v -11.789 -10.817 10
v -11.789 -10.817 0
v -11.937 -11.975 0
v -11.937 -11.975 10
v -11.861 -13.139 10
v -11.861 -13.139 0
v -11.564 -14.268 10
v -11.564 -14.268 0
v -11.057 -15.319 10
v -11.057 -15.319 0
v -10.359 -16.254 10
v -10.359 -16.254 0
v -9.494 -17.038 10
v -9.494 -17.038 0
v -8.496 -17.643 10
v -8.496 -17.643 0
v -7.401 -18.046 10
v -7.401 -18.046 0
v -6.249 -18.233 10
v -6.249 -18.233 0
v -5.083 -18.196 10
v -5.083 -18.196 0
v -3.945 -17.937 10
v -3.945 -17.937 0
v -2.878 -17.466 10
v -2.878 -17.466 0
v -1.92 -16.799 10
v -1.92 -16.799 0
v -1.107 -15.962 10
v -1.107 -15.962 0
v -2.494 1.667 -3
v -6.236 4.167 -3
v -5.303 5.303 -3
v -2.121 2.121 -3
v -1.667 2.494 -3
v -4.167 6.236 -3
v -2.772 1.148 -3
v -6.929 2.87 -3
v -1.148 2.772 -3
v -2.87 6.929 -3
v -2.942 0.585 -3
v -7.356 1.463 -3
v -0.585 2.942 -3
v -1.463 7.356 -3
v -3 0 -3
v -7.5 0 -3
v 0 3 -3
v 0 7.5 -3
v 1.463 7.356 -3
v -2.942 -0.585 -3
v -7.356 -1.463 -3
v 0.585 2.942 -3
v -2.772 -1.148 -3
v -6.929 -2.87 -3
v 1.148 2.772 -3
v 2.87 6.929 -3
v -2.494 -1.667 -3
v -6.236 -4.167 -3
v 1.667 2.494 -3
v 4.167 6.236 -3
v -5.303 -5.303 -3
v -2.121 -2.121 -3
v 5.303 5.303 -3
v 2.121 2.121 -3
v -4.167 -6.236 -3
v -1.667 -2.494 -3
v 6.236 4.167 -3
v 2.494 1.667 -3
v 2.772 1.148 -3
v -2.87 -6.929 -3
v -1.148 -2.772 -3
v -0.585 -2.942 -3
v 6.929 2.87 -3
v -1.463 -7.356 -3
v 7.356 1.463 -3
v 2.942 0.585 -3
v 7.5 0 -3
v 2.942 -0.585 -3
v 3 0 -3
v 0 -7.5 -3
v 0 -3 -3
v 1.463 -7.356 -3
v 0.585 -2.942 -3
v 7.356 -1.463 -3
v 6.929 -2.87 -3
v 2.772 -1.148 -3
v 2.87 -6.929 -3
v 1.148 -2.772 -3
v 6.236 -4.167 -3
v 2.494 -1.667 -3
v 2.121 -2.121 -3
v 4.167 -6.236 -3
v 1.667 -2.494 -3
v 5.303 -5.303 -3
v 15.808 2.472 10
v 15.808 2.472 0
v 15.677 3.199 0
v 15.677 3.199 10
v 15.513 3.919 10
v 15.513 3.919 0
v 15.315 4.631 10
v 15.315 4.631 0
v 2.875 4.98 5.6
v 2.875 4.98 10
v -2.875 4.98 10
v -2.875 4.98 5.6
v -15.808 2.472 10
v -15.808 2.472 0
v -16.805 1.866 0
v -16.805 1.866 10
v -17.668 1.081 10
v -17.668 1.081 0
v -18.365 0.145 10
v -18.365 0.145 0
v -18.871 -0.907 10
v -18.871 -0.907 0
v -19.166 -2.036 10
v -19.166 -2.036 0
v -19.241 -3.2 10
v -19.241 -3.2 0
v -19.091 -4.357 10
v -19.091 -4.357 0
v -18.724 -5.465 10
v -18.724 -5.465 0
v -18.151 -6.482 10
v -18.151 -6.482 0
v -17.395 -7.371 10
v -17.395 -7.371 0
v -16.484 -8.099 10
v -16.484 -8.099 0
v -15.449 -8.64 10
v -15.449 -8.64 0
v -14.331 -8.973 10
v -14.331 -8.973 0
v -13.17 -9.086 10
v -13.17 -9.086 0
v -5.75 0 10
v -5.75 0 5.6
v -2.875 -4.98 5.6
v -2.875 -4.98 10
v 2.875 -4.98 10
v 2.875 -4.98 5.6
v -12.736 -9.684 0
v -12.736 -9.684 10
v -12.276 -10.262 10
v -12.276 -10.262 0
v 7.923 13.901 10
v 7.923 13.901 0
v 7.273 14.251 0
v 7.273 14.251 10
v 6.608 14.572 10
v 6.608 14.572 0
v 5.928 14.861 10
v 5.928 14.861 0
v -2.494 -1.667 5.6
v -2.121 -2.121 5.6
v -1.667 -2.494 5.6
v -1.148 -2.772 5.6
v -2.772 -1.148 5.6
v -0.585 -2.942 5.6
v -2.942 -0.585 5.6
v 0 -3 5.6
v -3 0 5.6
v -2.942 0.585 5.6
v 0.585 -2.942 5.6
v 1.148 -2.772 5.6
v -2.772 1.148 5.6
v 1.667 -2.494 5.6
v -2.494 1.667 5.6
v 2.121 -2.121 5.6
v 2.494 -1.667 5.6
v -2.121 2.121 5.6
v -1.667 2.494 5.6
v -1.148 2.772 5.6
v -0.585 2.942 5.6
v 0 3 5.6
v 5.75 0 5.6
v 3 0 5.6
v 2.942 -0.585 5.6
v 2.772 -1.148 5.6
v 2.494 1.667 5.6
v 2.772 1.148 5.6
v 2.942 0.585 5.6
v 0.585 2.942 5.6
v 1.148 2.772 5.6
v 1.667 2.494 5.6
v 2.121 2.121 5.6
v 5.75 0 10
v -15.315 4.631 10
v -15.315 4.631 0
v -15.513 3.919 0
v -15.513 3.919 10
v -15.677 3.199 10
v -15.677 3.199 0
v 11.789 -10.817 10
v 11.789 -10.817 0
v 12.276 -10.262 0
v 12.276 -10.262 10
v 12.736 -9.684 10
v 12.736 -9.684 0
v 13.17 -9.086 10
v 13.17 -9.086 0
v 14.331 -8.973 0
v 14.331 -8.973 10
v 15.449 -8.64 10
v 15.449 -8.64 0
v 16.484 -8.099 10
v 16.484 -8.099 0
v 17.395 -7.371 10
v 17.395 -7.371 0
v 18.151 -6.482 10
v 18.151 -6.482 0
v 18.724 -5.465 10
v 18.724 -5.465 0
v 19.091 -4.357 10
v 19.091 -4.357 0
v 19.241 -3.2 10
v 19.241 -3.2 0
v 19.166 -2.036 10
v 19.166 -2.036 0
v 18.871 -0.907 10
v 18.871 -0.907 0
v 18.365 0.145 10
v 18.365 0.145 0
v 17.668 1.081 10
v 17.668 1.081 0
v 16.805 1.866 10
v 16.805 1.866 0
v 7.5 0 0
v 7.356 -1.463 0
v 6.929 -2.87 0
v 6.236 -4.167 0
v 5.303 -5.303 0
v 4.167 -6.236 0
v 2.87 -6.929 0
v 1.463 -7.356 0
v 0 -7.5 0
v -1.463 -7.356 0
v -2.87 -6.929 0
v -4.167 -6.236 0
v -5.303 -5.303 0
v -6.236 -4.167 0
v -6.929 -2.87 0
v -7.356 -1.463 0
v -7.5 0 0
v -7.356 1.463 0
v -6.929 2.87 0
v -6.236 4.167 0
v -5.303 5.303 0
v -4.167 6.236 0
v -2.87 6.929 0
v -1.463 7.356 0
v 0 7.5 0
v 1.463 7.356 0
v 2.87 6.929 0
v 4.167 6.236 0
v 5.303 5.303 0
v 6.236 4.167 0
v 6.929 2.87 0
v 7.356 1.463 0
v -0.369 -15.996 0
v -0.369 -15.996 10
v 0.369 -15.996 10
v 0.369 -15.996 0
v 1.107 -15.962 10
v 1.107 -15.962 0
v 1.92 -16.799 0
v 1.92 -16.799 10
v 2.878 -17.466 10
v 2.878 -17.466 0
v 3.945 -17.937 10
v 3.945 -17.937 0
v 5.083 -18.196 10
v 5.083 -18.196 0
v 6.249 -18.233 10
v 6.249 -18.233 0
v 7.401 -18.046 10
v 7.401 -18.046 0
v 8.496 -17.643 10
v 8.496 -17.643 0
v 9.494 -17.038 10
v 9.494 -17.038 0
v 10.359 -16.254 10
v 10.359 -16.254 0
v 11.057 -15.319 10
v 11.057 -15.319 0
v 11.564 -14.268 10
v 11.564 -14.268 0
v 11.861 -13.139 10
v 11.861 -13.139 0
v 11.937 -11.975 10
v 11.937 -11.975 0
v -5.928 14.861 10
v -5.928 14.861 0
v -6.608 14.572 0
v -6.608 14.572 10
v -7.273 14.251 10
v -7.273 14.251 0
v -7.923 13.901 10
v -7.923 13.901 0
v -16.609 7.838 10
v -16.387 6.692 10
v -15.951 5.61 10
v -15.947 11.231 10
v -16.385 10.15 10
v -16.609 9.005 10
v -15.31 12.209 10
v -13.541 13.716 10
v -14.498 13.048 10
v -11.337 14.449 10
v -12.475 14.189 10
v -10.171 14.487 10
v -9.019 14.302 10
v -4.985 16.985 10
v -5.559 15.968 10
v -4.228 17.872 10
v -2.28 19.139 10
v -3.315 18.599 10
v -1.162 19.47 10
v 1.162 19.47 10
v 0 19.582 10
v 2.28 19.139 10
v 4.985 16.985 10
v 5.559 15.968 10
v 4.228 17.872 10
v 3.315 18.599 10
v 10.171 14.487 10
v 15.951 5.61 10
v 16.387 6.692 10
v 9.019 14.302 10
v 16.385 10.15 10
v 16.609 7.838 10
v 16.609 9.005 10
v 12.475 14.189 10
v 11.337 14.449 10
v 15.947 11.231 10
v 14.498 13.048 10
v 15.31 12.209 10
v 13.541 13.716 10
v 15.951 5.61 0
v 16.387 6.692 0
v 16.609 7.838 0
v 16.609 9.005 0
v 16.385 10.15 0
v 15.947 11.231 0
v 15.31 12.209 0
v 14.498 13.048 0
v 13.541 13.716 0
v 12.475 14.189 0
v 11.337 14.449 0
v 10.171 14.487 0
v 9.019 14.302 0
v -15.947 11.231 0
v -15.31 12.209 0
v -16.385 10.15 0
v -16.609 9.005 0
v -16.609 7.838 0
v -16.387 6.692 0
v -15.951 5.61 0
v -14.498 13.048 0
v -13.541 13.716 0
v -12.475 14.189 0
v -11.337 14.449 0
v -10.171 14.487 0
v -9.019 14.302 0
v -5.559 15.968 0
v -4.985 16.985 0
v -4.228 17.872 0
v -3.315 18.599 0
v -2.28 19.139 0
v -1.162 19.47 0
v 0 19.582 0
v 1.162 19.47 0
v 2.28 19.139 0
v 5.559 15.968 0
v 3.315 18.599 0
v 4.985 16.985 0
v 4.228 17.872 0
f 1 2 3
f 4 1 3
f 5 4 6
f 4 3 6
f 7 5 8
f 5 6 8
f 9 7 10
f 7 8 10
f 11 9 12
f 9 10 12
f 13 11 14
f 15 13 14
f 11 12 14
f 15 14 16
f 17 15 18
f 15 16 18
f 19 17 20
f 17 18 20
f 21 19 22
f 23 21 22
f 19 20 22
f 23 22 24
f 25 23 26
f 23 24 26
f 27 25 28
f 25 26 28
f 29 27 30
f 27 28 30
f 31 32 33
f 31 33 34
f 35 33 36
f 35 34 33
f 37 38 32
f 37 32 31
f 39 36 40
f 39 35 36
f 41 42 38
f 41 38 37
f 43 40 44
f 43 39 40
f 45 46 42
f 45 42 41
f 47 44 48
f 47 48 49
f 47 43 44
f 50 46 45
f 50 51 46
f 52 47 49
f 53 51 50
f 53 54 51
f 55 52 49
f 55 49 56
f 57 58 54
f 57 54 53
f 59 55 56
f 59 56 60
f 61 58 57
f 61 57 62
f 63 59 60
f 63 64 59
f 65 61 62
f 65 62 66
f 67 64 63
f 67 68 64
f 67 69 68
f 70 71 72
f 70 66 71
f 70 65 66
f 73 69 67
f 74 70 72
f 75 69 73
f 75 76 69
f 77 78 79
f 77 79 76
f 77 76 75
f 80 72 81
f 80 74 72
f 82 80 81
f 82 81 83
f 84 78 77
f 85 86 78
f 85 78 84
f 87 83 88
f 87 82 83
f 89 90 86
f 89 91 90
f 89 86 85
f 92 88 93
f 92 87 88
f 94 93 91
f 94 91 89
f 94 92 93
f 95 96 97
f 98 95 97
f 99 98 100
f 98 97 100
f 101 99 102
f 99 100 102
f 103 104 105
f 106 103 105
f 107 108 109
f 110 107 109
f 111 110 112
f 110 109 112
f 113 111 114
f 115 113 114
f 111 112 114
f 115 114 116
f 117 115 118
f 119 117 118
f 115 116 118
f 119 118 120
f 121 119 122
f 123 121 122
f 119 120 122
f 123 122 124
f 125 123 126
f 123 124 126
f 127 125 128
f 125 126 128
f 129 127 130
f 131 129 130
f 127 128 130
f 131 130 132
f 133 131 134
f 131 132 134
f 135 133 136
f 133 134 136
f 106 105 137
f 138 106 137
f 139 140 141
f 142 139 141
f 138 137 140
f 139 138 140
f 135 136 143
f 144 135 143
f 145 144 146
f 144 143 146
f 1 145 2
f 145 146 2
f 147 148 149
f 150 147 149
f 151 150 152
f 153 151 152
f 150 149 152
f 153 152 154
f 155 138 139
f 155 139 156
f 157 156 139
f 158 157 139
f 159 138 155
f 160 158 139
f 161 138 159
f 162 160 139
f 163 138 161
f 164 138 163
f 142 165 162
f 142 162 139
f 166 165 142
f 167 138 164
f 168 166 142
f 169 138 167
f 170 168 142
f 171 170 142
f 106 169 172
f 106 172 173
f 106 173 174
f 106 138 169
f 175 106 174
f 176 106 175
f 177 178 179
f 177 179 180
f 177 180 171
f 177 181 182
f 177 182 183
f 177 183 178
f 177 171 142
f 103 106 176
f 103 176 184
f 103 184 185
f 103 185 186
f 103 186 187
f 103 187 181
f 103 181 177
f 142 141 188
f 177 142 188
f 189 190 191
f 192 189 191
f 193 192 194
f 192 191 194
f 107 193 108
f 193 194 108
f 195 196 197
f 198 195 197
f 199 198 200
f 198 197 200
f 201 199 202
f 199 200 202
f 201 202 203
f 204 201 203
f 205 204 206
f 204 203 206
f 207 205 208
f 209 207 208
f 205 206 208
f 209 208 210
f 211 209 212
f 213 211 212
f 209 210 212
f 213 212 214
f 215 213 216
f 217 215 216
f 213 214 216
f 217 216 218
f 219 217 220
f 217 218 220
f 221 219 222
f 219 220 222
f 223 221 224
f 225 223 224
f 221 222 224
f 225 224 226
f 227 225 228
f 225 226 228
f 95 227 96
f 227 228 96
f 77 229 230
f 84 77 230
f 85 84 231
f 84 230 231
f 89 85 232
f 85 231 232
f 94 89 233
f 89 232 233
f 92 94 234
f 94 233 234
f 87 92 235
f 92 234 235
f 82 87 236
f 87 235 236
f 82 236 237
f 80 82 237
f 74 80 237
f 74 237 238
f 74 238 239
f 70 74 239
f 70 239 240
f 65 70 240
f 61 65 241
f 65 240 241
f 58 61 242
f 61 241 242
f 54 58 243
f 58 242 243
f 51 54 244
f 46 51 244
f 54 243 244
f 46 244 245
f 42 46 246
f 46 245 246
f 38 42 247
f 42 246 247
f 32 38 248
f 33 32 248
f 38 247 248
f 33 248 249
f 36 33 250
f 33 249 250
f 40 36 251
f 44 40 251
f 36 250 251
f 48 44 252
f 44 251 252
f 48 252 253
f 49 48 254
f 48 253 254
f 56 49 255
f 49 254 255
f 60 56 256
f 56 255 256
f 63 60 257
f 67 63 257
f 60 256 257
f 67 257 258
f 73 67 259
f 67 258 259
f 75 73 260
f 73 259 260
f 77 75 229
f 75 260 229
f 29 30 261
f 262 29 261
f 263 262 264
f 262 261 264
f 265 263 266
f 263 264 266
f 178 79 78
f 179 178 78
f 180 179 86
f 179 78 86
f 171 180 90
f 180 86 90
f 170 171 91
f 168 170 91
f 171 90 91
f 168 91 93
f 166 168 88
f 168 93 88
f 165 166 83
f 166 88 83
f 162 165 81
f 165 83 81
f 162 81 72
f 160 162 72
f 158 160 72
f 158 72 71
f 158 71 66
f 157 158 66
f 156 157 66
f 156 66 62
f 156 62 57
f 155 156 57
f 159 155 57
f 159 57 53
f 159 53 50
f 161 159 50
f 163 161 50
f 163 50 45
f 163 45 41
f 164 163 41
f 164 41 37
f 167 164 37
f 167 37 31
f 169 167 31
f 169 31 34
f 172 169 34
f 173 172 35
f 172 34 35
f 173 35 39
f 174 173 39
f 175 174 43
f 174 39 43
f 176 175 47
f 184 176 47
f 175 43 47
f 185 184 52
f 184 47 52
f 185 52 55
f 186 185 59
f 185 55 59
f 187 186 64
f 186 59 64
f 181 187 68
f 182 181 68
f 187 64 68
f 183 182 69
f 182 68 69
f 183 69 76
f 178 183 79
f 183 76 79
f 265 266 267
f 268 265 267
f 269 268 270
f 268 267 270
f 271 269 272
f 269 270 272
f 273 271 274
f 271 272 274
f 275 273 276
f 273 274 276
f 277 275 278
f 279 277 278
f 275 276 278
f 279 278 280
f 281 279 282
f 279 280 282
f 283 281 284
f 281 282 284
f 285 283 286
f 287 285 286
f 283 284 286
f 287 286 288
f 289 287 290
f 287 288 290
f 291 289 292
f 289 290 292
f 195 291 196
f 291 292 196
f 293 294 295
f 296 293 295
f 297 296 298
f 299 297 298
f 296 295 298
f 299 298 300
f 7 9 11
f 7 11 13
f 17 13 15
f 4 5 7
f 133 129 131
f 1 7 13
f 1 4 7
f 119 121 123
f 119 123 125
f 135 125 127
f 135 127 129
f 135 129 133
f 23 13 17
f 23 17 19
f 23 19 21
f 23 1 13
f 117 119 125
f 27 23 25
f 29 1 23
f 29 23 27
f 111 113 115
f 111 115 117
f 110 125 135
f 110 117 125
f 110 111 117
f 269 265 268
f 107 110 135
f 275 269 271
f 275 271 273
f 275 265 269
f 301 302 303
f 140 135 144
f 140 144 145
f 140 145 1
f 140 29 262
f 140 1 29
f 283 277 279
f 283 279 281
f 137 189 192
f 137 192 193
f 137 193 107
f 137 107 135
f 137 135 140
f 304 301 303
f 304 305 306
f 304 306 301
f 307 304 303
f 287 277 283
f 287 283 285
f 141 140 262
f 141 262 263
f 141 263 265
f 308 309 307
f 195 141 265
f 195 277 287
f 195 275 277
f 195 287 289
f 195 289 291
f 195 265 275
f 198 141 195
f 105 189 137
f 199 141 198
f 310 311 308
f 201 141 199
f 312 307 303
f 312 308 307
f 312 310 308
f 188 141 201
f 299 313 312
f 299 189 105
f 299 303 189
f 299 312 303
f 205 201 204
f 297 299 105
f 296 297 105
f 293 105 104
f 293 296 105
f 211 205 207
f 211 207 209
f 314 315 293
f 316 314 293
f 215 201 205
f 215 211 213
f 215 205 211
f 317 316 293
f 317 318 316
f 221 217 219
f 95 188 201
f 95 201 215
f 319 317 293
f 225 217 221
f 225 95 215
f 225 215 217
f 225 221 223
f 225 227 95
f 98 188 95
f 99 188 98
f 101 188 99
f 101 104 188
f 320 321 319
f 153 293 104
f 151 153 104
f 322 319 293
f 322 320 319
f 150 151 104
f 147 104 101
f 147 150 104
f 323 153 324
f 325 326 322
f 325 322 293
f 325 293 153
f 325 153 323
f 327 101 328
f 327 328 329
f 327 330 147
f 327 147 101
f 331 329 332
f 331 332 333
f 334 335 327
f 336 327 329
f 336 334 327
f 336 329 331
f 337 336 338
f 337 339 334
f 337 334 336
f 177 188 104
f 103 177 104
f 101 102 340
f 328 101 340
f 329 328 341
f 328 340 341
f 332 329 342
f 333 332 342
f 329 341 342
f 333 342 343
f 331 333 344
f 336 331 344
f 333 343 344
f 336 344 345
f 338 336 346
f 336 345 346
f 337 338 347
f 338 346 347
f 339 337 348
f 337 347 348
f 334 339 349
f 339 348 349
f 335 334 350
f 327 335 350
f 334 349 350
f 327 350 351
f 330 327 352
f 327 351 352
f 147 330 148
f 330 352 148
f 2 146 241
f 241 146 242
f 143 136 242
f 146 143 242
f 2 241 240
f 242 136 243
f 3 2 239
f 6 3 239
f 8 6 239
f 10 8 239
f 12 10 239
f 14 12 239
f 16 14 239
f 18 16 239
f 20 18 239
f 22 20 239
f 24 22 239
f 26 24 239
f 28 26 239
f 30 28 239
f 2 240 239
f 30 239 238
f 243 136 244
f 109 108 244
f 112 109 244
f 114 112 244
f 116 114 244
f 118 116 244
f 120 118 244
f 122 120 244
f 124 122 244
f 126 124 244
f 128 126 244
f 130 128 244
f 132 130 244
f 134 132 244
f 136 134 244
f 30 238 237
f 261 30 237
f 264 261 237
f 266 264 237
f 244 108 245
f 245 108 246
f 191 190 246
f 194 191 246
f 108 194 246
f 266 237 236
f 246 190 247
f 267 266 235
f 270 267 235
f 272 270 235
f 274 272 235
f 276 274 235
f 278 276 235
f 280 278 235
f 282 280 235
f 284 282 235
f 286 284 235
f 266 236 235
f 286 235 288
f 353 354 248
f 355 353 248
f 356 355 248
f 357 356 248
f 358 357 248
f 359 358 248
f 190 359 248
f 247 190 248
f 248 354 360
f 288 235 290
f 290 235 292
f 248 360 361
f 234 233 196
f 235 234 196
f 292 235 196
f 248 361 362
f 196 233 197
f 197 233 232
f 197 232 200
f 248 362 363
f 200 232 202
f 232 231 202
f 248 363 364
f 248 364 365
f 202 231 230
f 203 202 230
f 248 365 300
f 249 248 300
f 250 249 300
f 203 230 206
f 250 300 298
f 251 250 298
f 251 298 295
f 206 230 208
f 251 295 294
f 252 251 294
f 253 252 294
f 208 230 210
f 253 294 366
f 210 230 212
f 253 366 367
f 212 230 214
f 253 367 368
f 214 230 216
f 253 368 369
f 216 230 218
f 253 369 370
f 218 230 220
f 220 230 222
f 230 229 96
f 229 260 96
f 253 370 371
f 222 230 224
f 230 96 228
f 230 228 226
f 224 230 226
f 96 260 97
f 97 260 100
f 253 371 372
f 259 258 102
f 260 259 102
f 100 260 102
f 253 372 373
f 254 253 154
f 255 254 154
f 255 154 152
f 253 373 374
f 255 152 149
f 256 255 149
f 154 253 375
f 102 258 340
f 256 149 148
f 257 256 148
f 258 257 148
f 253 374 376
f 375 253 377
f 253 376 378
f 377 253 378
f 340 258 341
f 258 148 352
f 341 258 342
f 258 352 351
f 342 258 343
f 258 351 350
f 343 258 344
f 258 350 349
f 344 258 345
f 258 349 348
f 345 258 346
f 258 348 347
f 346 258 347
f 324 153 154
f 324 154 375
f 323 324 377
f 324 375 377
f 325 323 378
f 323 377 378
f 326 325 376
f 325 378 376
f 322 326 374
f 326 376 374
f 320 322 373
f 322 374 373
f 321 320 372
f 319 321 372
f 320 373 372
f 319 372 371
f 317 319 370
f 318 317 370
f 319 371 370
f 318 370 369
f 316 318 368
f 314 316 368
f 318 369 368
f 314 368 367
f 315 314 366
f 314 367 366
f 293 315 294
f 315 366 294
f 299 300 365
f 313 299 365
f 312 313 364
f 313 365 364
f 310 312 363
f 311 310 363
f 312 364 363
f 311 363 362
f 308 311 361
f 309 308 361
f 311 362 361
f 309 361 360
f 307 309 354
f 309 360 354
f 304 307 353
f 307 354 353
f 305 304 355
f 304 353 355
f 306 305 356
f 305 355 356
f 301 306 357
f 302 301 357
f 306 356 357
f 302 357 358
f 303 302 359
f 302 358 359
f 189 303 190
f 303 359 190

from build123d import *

# Parameters (mm, degrees)
F1_DEPTH = 10
F3_DEPTH = 4.4
F4_R     = 7.5
F5_DEPTH = 3
F6_R     = 3
F7_DEPTH = 13.001


with BuildPart() as f1:
    # F0 (on Top) → F1 (new body)
    with BuildSketch(Plane.XY):
        with BuildLine():
            ThreePointArc((5.928073, 14.86129), (0, 19.582365), (-5.928073, 14.86129))
            ThreePointArc((-5.928073, 14.86129), (-6.94214, 14.415502), (-7.922931, 13.900617))
            ThreePointArc((-7.922931, 13.900617), (-15.31011, 12.209405), (-15.315118, 4.631108))
            ThreePointArc((-15.315118, 4.631108), (-15.598847, 3.560335), (-15.807807, 2.472496))
            ThreePointArc((-15.807807, 2.472496), (-19.091394, -4.357486), (-13.169566, -9.086392))
            ThreePointArc((-13.169566, -9.086392), (-12.509304, -9.975837), (-11.789082, -10.817465))
            ThreePointArc((-11.789082, -10.817465), (-8.49647, -17.643101), (-1.107063, -15.961654))
            ThreePointArc((-1.107063, -15.961654), (0, -16), (1.107063, -15.961654))
            ThreePointArc((1.107063, -15.961654), (8.49647, -17.643101), (11.789082, -10.817465))
            ThreePointArc((11.789082, -10.817465), (12.509304, -9.975837), (13.169566, -9.086392))
            ThreePointArc((13.169566, -9.086392), (19.091394, -4.357486), (15.807807, 2.472496))
            ThreePointArc((15.807807, 2.472496), (15.598847, 3.560335), (15.315118, 4.631108))
            ThreePointArc((15.315118, 4.631108), (15.31011, 12.209405), (7.922931, 13.900617))
            ThreePointArc((7.922931, 13.900617), (6.94214, 14.415502), (5.928073, 14.86129))
        make_face()
    extrude(amount=F1_DEPTH)

    # F2 (on face) → F3 (cut)
    with BuildSketch(Plane.XY.offset(10)):
        Polygon((2.875, -4.979646), (5.75, 0), (2.875, 4.979646), (-2.875, 4.979646), (-5.75, 0), (-2.875, -4.979646), align=None)
    extrude(amount=-F3_DEPTH, mode=Mode.SUBTRACT)

    # F4 (on face) → F5 (join)
    with BuildSketch(Plane(origin=(0, 0, 0), x_dir=(1, 0, 0), z_dir=(0, 0, -1))):
        Circle(F4_R)
    extrude(amount=F5_DEPTH)

    # F6 (on face) → F7 (cut, through all)
    with BuildSketch(Plane(origin=(0, 0, -3), x_dir=(1, 0, 0), z_dir=(0, 0, -1))):
        Circle(F6_R)
    extrude(amount=-F7_DEPTH, mode=Mode.SUBTRACT)


solid = f1.part
